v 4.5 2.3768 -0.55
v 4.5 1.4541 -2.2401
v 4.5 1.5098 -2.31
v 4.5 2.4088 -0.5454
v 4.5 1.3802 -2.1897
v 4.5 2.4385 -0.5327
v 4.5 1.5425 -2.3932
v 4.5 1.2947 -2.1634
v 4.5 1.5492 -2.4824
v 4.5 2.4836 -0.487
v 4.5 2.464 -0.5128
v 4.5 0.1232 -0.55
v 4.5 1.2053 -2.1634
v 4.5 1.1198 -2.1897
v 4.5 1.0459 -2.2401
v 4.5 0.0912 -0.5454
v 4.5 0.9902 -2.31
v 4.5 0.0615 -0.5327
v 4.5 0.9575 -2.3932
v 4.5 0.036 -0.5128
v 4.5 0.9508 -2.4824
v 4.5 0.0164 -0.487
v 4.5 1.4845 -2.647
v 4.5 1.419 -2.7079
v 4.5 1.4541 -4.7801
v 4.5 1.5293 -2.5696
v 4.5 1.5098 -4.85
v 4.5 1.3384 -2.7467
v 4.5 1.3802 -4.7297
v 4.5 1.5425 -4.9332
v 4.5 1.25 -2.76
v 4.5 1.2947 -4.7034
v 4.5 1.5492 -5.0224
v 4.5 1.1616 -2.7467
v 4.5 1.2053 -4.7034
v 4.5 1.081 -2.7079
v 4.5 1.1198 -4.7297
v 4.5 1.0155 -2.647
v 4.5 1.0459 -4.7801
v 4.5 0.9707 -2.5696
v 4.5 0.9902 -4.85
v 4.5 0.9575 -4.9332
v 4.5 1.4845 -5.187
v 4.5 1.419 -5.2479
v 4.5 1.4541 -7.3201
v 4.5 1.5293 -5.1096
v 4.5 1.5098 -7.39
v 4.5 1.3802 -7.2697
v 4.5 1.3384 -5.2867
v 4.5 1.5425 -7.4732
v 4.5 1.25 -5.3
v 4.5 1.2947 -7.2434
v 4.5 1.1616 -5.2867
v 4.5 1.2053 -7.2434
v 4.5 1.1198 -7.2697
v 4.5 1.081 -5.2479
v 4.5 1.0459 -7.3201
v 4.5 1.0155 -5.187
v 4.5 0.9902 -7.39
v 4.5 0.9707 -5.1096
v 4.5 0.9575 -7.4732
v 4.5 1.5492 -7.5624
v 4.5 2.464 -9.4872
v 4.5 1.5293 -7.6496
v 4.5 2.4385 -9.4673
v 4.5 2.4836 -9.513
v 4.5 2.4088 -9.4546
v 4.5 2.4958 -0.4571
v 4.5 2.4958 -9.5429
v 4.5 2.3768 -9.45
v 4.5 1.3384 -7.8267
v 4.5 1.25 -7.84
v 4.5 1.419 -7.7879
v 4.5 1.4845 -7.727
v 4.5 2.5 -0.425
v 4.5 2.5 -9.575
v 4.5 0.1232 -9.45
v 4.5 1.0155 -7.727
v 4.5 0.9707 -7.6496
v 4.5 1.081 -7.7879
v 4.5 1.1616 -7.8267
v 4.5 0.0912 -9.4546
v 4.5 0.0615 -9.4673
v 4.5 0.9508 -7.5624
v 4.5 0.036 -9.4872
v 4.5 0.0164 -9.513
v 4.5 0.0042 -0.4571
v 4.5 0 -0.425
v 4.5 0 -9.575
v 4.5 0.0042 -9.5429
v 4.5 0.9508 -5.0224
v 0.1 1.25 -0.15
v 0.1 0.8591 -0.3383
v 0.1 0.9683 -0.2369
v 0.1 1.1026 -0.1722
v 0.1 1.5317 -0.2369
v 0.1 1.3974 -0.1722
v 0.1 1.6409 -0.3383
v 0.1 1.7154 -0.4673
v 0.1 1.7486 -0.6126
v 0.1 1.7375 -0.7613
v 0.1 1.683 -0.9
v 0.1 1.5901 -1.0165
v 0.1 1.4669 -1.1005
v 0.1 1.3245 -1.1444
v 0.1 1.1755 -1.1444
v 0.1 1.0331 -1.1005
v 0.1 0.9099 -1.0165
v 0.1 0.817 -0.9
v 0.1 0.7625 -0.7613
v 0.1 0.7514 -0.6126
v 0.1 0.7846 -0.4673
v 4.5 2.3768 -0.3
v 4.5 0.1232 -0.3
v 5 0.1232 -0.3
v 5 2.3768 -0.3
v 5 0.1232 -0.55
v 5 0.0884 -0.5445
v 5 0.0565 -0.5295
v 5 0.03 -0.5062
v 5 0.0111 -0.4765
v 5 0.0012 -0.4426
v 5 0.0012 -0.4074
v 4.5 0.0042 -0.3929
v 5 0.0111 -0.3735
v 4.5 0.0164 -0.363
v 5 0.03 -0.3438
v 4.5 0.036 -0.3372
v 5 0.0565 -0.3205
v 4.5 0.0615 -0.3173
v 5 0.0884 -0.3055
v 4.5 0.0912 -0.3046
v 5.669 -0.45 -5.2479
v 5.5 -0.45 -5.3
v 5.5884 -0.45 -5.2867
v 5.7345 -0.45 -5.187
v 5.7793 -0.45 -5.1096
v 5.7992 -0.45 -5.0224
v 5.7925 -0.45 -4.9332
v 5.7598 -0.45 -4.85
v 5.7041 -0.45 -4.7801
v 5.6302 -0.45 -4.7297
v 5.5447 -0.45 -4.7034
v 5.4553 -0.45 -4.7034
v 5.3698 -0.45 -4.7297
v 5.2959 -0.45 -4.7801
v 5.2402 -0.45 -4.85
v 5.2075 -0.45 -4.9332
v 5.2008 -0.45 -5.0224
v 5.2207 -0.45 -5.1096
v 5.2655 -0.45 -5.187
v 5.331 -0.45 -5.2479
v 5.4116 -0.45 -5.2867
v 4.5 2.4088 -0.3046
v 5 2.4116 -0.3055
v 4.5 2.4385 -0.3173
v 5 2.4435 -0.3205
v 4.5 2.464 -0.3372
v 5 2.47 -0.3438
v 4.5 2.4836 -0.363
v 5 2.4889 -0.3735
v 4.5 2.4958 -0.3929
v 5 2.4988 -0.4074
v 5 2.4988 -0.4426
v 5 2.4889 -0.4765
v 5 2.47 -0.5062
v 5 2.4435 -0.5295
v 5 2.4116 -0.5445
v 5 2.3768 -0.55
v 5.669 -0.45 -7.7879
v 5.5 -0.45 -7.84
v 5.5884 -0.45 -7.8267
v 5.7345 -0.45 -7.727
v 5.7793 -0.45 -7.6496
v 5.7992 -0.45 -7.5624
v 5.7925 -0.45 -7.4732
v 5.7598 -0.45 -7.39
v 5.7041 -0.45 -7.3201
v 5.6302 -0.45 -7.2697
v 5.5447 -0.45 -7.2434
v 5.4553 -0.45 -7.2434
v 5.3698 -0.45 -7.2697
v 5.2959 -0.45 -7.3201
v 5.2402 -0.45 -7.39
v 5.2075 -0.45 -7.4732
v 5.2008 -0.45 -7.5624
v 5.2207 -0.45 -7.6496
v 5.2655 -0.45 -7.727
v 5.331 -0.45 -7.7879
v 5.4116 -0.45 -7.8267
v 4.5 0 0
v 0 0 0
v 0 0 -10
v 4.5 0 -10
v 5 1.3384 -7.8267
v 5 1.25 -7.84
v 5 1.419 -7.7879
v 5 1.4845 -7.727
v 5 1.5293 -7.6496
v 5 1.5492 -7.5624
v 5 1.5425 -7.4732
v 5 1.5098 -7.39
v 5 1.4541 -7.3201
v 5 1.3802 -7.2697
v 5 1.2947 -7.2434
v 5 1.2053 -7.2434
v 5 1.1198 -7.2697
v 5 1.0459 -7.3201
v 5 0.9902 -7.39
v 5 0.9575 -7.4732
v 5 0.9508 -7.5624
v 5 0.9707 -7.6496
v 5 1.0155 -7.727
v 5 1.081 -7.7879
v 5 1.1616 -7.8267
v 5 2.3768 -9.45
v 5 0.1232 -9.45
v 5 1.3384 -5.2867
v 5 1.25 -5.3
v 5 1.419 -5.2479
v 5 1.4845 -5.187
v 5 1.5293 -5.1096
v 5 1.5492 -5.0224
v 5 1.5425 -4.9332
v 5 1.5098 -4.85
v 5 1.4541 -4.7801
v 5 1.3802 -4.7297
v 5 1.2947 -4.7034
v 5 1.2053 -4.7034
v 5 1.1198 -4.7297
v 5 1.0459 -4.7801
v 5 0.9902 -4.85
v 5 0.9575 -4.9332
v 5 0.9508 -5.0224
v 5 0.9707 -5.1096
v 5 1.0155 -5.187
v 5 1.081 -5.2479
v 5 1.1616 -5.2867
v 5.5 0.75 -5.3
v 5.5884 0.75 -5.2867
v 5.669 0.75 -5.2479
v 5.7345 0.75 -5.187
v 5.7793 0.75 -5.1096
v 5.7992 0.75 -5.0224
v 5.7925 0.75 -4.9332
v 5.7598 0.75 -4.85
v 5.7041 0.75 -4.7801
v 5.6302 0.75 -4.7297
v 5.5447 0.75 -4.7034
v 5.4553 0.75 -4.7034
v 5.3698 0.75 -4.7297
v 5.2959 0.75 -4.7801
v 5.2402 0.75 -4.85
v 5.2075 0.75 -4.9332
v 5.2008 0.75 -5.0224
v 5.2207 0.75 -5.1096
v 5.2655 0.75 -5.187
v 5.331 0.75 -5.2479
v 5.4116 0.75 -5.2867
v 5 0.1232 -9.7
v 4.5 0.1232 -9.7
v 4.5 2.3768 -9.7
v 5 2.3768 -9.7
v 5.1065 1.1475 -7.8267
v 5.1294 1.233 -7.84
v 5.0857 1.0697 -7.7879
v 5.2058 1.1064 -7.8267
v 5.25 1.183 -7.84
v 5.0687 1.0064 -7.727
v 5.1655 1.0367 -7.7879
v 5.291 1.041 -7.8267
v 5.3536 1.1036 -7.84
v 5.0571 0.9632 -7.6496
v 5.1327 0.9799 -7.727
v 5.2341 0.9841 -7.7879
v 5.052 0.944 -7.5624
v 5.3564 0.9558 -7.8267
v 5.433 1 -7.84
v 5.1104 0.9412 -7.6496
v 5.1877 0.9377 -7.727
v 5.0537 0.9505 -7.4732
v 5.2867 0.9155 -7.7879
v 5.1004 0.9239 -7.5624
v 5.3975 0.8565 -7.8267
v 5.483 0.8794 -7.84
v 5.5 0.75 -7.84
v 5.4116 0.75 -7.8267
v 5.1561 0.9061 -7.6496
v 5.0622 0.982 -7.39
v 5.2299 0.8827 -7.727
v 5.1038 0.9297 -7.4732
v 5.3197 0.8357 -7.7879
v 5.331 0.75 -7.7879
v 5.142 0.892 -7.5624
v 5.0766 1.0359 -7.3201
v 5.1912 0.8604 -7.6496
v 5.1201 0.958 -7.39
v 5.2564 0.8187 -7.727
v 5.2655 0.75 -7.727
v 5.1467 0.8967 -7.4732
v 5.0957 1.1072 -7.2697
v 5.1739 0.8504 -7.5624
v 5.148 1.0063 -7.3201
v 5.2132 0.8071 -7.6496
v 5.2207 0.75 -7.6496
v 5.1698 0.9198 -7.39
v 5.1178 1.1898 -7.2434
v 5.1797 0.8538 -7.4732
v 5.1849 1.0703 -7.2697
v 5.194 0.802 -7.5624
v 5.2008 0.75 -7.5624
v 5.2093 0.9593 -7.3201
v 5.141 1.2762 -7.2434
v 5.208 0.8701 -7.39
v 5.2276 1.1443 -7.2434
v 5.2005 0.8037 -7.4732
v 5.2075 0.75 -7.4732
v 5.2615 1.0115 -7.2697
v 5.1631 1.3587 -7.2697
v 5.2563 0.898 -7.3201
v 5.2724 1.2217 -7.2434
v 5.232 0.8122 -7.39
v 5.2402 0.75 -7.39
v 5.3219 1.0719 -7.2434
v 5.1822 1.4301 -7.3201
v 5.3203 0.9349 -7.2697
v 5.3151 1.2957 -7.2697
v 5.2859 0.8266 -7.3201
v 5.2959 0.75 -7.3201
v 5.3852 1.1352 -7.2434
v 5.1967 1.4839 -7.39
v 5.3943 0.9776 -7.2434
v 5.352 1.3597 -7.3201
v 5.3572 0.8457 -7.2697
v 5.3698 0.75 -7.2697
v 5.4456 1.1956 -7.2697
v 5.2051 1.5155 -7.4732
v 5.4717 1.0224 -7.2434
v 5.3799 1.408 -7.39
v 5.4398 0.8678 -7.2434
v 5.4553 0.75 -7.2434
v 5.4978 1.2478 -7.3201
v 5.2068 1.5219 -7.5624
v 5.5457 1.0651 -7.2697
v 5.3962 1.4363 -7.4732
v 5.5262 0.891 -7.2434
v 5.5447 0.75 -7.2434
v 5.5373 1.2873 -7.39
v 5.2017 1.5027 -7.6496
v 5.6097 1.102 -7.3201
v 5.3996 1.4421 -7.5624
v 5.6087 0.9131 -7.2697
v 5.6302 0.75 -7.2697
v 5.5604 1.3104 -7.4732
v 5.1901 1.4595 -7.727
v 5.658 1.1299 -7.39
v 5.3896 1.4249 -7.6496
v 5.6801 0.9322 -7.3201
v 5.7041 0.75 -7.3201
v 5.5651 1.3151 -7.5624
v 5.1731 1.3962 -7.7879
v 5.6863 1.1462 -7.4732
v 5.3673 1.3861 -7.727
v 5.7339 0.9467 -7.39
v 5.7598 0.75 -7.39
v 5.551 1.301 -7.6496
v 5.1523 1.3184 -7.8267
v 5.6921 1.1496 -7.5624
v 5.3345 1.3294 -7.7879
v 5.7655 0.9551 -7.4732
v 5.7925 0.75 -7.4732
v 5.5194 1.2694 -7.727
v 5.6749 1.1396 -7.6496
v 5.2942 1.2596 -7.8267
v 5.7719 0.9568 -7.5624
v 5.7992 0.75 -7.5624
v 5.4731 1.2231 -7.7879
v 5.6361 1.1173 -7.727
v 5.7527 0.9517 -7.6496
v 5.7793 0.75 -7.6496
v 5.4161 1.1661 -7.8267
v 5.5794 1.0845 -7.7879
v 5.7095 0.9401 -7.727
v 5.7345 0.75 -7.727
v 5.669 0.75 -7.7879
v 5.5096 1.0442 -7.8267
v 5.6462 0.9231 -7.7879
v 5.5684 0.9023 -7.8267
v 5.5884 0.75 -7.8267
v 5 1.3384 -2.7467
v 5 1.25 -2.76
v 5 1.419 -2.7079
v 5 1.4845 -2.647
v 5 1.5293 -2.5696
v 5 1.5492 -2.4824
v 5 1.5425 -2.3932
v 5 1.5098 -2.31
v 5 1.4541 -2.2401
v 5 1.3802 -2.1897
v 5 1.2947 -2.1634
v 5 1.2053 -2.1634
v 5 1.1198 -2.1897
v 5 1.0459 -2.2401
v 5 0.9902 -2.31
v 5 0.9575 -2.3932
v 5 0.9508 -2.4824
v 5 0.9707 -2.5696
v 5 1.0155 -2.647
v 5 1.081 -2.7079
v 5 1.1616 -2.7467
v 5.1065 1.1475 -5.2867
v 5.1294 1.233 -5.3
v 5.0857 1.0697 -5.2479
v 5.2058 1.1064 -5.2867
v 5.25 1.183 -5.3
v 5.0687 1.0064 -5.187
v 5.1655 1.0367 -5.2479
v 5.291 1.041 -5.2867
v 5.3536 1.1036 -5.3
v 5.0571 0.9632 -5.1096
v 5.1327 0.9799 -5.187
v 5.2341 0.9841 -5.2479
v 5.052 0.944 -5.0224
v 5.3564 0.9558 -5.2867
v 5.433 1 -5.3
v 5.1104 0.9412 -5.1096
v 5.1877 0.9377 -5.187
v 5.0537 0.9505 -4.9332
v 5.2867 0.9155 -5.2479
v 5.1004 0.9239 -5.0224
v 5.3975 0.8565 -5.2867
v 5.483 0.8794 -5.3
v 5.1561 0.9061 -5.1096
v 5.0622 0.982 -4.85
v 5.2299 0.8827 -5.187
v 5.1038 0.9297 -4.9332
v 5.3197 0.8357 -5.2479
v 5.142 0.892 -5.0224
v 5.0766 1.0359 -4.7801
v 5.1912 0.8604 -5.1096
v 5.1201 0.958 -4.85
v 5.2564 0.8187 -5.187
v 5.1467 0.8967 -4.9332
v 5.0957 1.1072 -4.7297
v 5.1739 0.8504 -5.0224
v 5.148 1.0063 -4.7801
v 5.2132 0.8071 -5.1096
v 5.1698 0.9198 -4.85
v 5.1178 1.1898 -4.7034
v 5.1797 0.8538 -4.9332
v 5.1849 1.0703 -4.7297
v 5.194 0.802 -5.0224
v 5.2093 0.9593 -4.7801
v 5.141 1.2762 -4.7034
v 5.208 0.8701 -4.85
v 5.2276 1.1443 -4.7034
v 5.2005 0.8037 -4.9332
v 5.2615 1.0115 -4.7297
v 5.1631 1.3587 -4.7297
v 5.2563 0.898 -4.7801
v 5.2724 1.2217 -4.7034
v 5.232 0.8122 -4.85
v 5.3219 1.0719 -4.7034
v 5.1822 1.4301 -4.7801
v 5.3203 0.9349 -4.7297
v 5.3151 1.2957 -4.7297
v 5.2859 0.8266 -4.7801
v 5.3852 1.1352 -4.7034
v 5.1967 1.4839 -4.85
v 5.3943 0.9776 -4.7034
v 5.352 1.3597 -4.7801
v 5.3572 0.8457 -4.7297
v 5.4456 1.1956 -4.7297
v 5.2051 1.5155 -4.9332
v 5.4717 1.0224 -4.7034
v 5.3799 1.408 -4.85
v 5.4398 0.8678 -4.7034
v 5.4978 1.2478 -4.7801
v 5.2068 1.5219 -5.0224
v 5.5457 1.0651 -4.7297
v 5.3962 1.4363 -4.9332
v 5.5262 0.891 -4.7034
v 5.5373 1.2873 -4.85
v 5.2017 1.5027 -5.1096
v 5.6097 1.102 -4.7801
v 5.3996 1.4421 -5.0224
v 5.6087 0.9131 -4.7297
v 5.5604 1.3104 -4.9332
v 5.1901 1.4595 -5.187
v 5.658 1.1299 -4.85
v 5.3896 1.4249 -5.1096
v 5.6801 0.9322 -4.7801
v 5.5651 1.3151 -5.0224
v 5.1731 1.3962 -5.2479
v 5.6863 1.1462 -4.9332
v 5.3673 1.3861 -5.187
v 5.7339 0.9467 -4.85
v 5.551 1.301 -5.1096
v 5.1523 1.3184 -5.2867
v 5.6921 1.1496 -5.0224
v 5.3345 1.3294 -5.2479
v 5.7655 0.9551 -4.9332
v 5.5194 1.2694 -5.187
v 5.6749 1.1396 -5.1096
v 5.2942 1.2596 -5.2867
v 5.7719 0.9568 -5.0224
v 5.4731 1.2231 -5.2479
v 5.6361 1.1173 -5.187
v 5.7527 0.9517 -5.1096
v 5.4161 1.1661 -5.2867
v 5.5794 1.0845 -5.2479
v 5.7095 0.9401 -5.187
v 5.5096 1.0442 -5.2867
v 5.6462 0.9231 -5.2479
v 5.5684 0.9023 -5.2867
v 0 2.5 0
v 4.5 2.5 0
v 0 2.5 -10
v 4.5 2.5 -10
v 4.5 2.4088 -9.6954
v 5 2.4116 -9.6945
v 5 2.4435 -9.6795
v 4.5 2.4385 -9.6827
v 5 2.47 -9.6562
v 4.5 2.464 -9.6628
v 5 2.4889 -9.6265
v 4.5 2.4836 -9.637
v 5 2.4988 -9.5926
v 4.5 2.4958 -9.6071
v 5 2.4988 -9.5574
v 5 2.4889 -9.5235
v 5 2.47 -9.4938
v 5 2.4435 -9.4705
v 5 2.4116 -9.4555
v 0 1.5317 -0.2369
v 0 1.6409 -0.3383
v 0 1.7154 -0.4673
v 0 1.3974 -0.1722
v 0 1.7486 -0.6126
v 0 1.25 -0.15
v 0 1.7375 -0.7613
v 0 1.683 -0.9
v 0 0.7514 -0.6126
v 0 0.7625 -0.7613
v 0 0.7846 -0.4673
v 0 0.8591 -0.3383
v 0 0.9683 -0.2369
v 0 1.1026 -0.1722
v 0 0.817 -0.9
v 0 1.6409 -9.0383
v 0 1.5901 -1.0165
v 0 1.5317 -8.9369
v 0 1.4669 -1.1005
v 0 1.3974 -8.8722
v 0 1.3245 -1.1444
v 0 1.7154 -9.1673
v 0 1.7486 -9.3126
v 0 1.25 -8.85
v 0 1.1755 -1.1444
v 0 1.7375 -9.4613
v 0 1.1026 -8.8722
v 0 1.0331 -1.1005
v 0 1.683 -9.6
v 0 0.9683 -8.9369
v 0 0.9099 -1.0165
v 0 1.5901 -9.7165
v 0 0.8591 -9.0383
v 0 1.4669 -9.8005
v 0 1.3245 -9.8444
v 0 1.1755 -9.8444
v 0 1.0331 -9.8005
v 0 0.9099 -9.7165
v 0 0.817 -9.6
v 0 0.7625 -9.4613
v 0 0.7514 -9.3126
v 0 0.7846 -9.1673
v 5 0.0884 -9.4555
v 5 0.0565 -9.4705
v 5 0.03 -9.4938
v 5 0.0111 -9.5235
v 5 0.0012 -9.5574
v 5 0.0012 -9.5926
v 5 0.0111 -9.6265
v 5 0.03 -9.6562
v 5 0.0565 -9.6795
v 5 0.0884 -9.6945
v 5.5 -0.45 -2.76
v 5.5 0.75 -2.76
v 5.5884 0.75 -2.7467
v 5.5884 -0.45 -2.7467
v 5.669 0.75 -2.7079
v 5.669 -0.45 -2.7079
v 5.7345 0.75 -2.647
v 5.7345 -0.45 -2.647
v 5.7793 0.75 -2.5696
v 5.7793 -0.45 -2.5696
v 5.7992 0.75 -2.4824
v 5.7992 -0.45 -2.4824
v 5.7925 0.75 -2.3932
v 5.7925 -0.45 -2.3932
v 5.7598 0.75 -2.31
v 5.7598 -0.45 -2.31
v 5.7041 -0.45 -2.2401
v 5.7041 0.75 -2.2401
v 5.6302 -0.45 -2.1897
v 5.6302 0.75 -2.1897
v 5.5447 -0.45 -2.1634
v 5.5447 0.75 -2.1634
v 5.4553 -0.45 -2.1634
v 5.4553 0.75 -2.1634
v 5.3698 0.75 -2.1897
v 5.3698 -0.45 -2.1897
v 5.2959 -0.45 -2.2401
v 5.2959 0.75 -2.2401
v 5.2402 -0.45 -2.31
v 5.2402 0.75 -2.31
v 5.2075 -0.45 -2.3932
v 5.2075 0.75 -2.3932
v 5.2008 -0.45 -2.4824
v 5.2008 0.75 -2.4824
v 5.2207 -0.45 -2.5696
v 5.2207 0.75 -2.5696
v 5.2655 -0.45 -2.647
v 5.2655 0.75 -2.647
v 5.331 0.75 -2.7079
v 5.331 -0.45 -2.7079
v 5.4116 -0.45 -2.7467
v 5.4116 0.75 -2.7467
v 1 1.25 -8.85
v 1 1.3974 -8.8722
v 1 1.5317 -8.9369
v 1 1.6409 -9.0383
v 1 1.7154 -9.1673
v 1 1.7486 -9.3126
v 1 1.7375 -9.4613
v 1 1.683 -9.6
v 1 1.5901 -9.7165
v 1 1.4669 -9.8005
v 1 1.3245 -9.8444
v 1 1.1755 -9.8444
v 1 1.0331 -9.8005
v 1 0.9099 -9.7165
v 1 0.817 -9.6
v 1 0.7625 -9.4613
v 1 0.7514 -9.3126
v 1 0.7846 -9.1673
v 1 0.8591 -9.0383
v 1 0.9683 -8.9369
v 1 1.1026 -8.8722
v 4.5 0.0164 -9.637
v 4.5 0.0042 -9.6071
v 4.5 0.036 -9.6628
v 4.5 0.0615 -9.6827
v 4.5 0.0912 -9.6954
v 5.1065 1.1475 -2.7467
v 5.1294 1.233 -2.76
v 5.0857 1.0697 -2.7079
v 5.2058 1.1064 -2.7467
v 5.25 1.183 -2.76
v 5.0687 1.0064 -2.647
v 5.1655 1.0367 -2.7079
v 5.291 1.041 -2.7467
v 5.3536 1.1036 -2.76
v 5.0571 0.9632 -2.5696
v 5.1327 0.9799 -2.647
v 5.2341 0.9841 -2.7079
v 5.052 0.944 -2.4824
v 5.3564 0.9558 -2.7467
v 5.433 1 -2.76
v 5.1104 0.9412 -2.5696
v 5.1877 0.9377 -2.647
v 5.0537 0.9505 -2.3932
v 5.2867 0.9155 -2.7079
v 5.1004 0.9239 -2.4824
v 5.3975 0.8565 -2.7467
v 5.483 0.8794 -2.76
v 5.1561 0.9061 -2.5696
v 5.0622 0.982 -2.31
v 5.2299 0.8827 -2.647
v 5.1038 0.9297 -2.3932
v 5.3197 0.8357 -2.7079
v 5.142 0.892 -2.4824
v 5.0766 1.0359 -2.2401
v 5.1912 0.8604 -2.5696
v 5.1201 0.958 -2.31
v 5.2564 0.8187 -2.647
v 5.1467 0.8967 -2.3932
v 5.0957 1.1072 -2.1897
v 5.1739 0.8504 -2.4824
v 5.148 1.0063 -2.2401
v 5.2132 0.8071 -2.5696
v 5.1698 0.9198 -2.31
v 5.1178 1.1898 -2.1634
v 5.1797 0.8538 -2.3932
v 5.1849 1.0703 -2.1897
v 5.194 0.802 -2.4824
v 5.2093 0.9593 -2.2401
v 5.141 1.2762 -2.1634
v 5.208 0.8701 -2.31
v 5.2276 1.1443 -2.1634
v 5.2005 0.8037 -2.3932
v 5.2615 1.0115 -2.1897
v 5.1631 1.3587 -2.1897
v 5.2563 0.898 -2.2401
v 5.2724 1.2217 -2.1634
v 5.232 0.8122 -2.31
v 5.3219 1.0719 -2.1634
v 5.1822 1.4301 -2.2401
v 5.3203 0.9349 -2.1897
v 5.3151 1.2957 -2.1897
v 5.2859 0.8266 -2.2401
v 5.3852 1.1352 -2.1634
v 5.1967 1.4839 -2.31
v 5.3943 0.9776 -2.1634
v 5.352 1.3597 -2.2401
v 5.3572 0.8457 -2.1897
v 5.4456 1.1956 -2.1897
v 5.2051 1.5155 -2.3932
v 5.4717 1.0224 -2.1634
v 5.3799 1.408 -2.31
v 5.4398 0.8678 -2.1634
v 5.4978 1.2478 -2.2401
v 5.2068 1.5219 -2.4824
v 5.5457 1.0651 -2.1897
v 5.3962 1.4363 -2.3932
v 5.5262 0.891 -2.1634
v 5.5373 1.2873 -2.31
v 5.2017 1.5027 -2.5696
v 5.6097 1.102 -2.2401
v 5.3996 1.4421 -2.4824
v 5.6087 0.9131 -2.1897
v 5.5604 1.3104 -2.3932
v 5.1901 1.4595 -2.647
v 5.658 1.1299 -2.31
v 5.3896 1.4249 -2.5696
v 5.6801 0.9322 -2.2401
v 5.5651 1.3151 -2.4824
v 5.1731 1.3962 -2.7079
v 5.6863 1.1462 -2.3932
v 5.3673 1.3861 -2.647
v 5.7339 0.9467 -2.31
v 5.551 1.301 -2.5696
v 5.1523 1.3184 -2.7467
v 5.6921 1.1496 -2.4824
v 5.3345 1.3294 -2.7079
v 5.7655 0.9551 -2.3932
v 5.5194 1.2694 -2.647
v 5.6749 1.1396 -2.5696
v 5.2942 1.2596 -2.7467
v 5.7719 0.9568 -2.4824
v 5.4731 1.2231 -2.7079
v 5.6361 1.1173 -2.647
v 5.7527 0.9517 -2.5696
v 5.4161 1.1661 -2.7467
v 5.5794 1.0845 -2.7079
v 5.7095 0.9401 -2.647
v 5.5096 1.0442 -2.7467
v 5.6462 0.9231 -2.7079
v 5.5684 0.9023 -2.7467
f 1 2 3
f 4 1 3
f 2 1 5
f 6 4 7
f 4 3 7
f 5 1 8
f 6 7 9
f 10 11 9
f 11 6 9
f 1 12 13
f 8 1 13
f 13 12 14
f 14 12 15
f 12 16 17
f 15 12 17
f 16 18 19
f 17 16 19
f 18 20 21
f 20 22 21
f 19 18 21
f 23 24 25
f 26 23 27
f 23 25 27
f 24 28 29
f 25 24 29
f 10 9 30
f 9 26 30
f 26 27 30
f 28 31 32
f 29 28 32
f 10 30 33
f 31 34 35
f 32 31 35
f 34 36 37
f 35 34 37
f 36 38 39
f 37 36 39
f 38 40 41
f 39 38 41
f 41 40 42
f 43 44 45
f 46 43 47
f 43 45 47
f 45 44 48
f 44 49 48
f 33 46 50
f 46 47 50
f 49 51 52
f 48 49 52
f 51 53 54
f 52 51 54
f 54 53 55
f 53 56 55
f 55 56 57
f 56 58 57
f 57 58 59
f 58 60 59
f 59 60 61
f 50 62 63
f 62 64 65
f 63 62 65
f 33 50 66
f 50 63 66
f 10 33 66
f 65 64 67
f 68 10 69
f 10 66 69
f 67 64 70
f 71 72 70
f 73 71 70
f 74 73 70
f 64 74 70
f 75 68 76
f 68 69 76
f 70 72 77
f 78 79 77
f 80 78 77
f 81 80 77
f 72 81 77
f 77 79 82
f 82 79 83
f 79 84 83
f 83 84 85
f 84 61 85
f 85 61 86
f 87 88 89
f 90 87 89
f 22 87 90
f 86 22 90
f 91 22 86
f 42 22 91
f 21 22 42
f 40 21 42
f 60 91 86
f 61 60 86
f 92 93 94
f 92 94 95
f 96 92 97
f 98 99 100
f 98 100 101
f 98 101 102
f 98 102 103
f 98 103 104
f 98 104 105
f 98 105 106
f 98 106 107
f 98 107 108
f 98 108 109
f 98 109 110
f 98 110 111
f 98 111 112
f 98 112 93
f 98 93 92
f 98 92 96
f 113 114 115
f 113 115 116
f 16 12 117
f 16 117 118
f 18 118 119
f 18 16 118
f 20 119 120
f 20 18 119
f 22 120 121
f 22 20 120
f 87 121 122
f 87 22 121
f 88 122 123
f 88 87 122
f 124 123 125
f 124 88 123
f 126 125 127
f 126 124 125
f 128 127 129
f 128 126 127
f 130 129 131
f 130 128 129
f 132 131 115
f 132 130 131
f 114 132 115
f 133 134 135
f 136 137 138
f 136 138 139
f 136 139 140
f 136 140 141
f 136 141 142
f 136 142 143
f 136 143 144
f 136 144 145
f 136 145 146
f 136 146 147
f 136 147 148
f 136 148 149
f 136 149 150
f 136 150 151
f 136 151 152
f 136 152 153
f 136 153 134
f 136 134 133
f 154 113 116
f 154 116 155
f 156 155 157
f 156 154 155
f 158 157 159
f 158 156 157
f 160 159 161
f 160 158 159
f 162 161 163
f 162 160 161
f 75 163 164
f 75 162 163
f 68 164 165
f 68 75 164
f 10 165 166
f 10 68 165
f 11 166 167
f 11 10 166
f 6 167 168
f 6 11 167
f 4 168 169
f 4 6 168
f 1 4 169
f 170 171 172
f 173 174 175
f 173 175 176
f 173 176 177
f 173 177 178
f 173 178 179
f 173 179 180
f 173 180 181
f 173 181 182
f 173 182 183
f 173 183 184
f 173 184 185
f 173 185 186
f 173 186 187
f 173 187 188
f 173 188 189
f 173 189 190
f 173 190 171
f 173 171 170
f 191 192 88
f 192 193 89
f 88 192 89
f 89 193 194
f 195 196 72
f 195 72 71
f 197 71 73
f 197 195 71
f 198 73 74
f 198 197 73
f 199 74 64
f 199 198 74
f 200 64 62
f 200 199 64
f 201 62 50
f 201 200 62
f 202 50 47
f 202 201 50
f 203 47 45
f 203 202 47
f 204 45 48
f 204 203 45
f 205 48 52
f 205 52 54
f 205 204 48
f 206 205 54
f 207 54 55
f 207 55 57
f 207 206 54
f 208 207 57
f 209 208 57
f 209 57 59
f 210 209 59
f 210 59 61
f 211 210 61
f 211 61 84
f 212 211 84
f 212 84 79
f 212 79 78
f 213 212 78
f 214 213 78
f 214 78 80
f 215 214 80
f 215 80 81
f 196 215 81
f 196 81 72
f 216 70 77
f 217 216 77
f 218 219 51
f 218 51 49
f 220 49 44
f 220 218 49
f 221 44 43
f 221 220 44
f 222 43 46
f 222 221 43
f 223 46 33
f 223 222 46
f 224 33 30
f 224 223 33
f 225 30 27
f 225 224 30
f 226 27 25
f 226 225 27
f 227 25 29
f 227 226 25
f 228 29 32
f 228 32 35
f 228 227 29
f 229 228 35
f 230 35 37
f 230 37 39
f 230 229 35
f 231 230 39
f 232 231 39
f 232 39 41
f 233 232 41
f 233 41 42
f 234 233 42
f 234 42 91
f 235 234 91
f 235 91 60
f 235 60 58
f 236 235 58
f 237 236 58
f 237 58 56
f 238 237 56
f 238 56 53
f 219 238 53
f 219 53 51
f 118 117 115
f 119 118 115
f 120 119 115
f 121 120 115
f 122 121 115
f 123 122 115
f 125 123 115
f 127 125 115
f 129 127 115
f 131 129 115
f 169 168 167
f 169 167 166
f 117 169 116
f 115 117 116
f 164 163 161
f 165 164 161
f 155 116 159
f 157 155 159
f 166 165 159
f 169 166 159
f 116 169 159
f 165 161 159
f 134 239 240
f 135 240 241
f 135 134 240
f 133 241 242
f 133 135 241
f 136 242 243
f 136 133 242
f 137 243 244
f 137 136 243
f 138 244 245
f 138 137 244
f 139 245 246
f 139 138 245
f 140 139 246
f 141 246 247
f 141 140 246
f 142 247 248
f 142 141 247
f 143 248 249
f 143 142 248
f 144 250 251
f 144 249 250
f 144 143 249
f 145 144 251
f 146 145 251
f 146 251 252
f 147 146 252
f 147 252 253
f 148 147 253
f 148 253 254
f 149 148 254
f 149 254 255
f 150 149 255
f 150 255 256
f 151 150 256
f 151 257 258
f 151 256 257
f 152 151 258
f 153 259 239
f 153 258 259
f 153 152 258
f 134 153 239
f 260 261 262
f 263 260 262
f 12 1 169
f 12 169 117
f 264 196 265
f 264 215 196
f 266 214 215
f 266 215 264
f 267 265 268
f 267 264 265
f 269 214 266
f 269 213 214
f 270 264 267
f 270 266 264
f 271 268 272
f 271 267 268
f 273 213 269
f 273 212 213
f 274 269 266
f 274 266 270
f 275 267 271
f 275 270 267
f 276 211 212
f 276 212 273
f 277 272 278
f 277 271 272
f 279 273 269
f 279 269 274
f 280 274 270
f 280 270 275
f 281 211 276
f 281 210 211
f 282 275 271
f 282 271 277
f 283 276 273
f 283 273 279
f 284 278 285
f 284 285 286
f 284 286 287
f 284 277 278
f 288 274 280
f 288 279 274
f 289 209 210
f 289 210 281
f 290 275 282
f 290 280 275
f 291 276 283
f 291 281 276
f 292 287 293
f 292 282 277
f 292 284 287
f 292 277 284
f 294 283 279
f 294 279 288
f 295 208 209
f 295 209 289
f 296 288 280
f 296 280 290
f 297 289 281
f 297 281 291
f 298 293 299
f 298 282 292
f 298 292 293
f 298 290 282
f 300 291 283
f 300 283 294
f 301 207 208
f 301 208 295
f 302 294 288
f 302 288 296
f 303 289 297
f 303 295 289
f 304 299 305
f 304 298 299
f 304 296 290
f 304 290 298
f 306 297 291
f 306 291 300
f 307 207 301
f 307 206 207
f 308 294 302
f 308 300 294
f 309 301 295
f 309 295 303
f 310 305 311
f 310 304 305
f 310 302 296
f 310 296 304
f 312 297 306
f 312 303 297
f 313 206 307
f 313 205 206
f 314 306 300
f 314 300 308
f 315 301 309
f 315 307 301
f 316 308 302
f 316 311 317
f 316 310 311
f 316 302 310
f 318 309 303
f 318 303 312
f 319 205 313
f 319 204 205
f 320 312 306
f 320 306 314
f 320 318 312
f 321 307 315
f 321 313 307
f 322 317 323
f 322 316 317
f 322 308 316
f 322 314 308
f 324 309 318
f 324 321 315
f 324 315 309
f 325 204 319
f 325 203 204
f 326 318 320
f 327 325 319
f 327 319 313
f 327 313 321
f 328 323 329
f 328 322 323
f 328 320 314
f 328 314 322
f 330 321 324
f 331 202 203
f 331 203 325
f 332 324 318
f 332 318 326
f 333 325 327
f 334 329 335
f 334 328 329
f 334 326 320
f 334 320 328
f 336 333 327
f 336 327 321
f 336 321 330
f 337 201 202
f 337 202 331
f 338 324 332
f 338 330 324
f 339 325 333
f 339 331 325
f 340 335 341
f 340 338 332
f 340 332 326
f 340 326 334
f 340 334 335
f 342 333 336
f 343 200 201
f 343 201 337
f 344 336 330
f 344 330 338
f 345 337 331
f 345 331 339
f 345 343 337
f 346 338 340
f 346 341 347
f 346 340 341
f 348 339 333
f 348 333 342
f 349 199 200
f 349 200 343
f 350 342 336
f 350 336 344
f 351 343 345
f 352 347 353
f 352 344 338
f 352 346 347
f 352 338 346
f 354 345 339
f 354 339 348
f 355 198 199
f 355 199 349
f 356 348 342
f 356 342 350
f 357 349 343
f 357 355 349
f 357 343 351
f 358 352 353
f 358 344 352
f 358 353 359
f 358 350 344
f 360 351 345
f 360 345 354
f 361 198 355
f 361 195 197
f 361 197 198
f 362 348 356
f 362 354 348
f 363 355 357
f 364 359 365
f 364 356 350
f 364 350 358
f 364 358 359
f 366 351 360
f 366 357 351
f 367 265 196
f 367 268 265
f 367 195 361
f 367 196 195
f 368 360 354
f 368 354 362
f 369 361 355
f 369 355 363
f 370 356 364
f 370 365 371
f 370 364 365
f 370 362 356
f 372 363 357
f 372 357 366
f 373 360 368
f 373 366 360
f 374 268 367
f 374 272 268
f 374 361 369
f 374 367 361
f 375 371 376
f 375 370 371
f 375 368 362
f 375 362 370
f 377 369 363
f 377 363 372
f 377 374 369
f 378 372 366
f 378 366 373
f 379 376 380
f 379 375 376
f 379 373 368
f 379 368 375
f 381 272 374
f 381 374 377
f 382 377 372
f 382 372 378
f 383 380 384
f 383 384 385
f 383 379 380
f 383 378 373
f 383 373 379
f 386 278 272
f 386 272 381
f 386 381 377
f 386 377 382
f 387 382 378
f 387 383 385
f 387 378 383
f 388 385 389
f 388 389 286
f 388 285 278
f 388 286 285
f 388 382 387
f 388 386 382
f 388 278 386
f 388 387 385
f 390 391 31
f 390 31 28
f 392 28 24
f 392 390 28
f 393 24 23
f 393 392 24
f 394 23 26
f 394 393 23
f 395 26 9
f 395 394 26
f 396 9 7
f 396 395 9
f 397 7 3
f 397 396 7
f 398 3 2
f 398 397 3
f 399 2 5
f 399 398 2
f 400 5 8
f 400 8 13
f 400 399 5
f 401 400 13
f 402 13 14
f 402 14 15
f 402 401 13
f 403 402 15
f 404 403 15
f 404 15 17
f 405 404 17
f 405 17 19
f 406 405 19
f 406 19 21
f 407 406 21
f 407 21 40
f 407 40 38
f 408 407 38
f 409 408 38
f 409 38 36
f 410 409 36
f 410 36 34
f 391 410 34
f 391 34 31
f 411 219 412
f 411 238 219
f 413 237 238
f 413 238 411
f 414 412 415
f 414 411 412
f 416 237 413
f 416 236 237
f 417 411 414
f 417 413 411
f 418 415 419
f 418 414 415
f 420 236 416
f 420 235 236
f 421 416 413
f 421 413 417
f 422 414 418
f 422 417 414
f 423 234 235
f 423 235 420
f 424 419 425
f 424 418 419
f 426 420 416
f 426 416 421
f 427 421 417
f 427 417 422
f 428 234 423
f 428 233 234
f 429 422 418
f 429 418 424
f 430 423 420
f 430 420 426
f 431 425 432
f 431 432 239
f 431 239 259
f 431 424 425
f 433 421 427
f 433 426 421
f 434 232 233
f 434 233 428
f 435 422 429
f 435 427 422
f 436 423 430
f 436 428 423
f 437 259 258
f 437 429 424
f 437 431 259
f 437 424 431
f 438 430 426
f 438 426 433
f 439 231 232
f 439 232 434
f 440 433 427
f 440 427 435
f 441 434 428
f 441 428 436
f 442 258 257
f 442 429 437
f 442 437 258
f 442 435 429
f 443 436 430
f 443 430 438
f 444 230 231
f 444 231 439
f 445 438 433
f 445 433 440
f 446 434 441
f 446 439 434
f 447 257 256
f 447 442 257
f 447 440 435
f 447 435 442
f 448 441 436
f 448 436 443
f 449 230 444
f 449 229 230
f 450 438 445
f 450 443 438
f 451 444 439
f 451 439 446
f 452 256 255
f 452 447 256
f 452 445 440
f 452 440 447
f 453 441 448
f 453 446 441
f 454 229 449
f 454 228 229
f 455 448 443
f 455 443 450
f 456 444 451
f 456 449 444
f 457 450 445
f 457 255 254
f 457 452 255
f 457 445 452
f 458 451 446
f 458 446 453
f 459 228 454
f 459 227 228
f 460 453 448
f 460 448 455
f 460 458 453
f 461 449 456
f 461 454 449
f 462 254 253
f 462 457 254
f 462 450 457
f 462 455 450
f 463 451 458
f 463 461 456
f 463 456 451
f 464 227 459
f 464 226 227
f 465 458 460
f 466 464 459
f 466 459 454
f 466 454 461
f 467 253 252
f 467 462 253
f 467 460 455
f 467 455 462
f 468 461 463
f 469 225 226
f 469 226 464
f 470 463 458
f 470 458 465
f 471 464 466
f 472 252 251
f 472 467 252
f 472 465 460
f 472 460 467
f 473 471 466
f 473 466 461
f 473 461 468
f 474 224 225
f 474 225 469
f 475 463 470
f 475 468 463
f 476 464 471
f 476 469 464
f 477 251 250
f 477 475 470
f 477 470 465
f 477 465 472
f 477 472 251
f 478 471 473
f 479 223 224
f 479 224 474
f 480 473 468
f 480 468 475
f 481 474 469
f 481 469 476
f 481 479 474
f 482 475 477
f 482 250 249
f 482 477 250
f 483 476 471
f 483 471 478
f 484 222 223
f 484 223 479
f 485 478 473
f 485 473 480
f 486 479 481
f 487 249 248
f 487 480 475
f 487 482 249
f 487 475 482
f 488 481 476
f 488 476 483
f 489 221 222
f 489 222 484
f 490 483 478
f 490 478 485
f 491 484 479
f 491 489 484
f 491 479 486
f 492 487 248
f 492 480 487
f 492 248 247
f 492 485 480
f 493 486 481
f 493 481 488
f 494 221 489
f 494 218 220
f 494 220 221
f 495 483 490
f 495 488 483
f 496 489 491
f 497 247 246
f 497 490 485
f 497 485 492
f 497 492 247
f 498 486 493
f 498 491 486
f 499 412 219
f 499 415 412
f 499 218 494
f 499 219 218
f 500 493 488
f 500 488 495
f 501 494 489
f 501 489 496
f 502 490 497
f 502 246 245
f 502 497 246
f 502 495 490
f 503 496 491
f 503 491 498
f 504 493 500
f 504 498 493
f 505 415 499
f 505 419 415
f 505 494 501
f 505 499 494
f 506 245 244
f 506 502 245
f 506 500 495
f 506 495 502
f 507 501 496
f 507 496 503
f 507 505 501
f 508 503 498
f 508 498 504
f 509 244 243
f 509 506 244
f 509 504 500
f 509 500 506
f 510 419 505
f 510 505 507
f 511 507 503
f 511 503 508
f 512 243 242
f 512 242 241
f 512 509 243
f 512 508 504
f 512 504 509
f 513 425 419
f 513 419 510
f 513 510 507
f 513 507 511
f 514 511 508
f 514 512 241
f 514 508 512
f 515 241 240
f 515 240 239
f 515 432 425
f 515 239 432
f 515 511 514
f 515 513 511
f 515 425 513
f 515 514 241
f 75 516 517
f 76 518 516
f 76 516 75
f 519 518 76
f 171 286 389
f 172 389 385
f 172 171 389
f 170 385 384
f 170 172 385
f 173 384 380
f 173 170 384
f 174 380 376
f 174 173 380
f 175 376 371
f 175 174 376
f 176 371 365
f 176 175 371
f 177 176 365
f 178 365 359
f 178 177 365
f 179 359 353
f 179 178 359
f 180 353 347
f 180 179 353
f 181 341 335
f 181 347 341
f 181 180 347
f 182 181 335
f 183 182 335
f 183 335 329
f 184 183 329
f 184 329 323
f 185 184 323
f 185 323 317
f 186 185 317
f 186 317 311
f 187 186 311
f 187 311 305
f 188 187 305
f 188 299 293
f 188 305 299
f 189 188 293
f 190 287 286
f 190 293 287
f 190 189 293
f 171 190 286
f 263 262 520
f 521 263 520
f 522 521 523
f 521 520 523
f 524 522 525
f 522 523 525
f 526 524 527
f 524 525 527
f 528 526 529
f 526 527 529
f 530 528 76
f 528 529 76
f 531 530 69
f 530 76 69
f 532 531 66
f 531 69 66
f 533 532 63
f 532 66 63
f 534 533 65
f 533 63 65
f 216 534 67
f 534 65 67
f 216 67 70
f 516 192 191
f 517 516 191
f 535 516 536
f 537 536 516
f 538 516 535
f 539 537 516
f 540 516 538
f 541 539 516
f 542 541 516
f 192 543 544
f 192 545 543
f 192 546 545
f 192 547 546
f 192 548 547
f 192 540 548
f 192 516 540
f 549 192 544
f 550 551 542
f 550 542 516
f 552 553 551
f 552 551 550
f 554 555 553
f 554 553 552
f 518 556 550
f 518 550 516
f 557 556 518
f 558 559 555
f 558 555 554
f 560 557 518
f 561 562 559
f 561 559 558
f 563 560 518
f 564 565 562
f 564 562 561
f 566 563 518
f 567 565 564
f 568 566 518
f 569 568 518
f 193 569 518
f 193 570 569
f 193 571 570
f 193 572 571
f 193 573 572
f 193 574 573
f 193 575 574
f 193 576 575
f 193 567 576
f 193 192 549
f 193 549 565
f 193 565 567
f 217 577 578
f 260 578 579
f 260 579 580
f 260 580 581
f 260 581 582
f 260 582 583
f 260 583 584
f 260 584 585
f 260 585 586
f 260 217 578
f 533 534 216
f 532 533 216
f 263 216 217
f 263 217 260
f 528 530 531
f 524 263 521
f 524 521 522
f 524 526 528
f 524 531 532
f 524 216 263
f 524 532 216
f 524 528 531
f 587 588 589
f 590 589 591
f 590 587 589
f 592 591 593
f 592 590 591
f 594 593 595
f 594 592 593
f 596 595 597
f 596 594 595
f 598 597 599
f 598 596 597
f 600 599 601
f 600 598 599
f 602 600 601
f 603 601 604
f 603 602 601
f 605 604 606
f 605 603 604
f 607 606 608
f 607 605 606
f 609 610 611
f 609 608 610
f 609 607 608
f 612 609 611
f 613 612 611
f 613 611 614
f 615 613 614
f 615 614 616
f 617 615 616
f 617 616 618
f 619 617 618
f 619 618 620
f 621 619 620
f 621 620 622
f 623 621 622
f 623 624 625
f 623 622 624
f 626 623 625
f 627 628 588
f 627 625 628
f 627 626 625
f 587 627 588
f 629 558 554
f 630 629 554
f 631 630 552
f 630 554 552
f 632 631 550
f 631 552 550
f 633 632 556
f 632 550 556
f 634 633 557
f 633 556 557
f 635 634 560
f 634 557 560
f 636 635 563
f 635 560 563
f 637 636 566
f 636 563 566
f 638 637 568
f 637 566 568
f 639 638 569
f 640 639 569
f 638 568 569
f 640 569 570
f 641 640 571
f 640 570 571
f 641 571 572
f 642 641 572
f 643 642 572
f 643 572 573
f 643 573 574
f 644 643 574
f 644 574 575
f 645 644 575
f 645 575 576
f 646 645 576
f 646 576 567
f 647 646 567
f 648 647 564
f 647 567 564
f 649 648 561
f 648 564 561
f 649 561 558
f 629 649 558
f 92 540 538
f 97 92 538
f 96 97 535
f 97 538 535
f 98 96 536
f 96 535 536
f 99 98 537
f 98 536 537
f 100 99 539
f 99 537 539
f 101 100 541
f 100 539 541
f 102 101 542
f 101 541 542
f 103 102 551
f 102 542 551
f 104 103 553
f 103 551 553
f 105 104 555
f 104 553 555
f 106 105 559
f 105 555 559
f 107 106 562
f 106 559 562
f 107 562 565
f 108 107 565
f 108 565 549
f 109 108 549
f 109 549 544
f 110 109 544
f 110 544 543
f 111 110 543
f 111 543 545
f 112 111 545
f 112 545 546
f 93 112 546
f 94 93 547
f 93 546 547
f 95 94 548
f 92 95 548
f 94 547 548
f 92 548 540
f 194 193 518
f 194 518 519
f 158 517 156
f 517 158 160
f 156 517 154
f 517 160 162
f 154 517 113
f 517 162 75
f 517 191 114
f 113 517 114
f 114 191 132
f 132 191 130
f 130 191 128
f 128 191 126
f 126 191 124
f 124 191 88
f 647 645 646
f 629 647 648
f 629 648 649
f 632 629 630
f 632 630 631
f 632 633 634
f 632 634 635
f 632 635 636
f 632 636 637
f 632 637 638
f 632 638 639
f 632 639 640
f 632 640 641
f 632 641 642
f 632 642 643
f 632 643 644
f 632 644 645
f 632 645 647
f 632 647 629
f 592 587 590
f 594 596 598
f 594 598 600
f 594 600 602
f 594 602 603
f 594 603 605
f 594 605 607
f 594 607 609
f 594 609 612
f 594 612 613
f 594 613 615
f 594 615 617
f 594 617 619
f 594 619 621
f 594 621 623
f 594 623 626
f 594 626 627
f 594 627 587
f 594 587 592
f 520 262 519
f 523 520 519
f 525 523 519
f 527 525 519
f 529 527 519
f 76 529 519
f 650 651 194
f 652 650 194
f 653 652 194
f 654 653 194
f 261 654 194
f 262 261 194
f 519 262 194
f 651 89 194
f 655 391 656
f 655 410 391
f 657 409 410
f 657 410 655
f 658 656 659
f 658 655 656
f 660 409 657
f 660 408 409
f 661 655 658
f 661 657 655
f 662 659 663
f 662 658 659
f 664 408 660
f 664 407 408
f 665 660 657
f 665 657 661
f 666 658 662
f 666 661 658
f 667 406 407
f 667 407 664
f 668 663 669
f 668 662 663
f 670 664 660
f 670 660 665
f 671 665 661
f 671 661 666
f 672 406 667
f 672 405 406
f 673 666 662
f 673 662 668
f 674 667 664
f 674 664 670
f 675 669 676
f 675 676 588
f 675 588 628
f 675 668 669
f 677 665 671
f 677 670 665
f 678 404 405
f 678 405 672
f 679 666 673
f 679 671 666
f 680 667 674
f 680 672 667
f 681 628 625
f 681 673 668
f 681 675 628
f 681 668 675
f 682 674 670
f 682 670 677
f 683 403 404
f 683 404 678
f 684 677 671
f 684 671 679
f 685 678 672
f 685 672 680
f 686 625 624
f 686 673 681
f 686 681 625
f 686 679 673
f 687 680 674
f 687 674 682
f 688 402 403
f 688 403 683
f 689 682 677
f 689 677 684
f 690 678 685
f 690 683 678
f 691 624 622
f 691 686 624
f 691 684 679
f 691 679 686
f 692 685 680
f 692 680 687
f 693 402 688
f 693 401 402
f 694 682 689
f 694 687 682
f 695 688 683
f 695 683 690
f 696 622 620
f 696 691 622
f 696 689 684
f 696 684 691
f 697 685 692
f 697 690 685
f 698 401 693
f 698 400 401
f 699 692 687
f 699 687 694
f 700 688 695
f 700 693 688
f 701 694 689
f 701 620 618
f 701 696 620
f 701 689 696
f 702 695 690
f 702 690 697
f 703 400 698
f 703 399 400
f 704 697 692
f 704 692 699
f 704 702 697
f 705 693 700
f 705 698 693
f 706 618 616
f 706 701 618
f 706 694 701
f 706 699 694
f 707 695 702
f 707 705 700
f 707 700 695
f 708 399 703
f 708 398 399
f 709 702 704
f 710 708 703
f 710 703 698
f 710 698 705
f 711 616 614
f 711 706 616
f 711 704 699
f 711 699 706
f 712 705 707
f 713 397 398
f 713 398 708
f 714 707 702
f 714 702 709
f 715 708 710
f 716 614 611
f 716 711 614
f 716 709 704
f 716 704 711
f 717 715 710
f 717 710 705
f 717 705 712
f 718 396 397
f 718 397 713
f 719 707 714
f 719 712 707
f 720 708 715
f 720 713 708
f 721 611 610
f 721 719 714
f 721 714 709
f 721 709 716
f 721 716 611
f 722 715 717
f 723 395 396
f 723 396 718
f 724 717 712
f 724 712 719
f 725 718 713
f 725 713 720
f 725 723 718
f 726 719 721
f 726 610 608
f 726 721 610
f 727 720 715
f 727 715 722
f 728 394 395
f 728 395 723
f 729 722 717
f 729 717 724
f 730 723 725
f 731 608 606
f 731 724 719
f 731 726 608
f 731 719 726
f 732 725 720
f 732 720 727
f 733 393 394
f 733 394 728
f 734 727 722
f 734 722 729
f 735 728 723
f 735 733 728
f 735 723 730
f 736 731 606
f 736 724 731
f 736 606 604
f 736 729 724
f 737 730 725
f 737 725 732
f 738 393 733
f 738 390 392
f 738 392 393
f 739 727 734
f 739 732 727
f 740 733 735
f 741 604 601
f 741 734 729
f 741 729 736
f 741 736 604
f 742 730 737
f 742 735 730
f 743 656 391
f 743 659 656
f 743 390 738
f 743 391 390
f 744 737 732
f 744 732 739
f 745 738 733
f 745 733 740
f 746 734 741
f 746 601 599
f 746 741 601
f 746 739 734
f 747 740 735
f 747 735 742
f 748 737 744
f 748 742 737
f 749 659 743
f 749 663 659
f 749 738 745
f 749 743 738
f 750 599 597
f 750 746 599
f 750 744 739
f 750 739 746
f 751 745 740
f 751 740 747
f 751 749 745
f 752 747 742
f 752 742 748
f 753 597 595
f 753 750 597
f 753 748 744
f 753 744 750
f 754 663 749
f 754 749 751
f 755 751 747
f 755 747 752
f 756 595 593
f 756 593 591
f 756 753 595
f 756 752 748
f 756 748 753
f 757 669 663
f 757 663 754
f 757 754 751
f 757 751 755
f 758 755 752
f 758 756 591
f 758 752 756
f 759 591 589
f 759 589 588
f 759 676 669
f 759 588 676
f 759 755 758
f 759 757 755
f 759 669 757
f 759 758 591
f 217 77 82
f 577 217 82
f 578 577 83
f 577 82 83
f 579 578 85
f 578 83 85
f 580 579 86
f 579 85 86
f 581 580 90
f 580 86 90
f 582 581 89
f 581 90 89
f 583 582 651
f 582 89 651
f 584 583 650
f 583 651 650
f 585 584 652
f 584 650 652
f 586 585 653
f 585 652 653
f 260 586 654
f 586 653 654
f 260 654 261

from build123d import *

# Parameters (mm, degrees)
SKETCH1_W          = 4.5
SKETCH1_H          = 10
BODY_SHAPE_DEPTH   = 2.5
SKETCH2_R          = 0.5
OFF_HOLE_DEPTH     = 1
SKETCH3_R          = 0.5
ON_HOLE_DEPTH      = 0.1
BOTTOM_FLAPS_DEPTH = 0.5
SKETCH4_R          = 0.3


with BuildPart() as part:
    # Sketch1 → Body Shape (new body)
    with BuildSketch(Plane(origin=(0, 0, 0), x_dir=(1, 0, 0), z_dir=(0, 1, 0))):
        with Locations((2.25, 5)):
            Rectangle(SKETCH1_W, SKETCH1_H)
    extrude(amount=BODY_SHAPE_DEPTH)

    # Sketch2 → Off Hole (cut)
    with BuildSketch(Plane.ZY):
        with Locations((-9.35, 1.25)):
            Circle(SKETCH2_R)
    extrude(amount=-OFF_HOLE_DEPTH, mode=Mode.SUBTRACT)

    # Sketch3 → On hole (cut)
    with BuildSketch(Plane.ZY):
        with Locations((-0.65, 1.25)):
            Circle(SKETCH3_R)
    extrude(amount=-ON_HOLE_DEPTH, mode=Mode.SUBTRACT)

    # Sketch8 → bottom flaps (add)
    with BuildSketch(Plane(origin=(4.5, 0, 0), x_dir=(0, 0, -1), z_dir=(1, 0, 0))):
        with BuildLine():
            Line((9.7, 0.123206048), (9.7, 2.376793952))
            ThreePointArc((9.7, 2.376793952), (9.575, 2.5), (9.45, 2.376793952))
            Line((9.45, 2.376793952), (9.45, 0.123206048))
            ThreePointArc((9.45, 0.123206048), (9.575, 0), (9.7, 0.123206048))
        make_face()
        with BuildLine():
            Line((0.3, 0.123206048), (0.3, 2.376793952))
            ThreePointArc((0.3, 2.376793952), (0.425, 2.5), (0.55, 2.376793952))
            Line((0.55, 2.376793952), (0.55, 0.123206048))
            ThreePointArc((0.55, 0.123206048), (0.425, 0), (0.3, 0.123206048))
        make_face()
    extrude(amount=BOTTOM_FLAPS_DEPTH)

    # pins: sweep along a path in Sketch9
    with BuildLine(Plane.XY.offset(-7.54)) as pins_path:
        Line((4.5, 1.25), (5, 1.25))
        ThreePointArc((5, 1.25), (5.353553391, 1.103553391), (5.5, 0.75))
        Line((5.5, 0.75), (5.5, -0.45))
    # Sketch4 → pins (sweep)
    with BuildSketch(Plane(origin=(4.5, 0, 0), x_dir=(0, 0, -1), z_dir=(1, 0, 0))):
        with Locations((7.54, 1.25)):
            Circle(SKETCH4_R)
        with Locations((5, 1.25)):
            Circle(SKETCH4_R)
        with Locations((2.46, 1.25)):
            Circle(SKETCH4_R)
    sweep(path=pins_path.line)


solid = part.part
